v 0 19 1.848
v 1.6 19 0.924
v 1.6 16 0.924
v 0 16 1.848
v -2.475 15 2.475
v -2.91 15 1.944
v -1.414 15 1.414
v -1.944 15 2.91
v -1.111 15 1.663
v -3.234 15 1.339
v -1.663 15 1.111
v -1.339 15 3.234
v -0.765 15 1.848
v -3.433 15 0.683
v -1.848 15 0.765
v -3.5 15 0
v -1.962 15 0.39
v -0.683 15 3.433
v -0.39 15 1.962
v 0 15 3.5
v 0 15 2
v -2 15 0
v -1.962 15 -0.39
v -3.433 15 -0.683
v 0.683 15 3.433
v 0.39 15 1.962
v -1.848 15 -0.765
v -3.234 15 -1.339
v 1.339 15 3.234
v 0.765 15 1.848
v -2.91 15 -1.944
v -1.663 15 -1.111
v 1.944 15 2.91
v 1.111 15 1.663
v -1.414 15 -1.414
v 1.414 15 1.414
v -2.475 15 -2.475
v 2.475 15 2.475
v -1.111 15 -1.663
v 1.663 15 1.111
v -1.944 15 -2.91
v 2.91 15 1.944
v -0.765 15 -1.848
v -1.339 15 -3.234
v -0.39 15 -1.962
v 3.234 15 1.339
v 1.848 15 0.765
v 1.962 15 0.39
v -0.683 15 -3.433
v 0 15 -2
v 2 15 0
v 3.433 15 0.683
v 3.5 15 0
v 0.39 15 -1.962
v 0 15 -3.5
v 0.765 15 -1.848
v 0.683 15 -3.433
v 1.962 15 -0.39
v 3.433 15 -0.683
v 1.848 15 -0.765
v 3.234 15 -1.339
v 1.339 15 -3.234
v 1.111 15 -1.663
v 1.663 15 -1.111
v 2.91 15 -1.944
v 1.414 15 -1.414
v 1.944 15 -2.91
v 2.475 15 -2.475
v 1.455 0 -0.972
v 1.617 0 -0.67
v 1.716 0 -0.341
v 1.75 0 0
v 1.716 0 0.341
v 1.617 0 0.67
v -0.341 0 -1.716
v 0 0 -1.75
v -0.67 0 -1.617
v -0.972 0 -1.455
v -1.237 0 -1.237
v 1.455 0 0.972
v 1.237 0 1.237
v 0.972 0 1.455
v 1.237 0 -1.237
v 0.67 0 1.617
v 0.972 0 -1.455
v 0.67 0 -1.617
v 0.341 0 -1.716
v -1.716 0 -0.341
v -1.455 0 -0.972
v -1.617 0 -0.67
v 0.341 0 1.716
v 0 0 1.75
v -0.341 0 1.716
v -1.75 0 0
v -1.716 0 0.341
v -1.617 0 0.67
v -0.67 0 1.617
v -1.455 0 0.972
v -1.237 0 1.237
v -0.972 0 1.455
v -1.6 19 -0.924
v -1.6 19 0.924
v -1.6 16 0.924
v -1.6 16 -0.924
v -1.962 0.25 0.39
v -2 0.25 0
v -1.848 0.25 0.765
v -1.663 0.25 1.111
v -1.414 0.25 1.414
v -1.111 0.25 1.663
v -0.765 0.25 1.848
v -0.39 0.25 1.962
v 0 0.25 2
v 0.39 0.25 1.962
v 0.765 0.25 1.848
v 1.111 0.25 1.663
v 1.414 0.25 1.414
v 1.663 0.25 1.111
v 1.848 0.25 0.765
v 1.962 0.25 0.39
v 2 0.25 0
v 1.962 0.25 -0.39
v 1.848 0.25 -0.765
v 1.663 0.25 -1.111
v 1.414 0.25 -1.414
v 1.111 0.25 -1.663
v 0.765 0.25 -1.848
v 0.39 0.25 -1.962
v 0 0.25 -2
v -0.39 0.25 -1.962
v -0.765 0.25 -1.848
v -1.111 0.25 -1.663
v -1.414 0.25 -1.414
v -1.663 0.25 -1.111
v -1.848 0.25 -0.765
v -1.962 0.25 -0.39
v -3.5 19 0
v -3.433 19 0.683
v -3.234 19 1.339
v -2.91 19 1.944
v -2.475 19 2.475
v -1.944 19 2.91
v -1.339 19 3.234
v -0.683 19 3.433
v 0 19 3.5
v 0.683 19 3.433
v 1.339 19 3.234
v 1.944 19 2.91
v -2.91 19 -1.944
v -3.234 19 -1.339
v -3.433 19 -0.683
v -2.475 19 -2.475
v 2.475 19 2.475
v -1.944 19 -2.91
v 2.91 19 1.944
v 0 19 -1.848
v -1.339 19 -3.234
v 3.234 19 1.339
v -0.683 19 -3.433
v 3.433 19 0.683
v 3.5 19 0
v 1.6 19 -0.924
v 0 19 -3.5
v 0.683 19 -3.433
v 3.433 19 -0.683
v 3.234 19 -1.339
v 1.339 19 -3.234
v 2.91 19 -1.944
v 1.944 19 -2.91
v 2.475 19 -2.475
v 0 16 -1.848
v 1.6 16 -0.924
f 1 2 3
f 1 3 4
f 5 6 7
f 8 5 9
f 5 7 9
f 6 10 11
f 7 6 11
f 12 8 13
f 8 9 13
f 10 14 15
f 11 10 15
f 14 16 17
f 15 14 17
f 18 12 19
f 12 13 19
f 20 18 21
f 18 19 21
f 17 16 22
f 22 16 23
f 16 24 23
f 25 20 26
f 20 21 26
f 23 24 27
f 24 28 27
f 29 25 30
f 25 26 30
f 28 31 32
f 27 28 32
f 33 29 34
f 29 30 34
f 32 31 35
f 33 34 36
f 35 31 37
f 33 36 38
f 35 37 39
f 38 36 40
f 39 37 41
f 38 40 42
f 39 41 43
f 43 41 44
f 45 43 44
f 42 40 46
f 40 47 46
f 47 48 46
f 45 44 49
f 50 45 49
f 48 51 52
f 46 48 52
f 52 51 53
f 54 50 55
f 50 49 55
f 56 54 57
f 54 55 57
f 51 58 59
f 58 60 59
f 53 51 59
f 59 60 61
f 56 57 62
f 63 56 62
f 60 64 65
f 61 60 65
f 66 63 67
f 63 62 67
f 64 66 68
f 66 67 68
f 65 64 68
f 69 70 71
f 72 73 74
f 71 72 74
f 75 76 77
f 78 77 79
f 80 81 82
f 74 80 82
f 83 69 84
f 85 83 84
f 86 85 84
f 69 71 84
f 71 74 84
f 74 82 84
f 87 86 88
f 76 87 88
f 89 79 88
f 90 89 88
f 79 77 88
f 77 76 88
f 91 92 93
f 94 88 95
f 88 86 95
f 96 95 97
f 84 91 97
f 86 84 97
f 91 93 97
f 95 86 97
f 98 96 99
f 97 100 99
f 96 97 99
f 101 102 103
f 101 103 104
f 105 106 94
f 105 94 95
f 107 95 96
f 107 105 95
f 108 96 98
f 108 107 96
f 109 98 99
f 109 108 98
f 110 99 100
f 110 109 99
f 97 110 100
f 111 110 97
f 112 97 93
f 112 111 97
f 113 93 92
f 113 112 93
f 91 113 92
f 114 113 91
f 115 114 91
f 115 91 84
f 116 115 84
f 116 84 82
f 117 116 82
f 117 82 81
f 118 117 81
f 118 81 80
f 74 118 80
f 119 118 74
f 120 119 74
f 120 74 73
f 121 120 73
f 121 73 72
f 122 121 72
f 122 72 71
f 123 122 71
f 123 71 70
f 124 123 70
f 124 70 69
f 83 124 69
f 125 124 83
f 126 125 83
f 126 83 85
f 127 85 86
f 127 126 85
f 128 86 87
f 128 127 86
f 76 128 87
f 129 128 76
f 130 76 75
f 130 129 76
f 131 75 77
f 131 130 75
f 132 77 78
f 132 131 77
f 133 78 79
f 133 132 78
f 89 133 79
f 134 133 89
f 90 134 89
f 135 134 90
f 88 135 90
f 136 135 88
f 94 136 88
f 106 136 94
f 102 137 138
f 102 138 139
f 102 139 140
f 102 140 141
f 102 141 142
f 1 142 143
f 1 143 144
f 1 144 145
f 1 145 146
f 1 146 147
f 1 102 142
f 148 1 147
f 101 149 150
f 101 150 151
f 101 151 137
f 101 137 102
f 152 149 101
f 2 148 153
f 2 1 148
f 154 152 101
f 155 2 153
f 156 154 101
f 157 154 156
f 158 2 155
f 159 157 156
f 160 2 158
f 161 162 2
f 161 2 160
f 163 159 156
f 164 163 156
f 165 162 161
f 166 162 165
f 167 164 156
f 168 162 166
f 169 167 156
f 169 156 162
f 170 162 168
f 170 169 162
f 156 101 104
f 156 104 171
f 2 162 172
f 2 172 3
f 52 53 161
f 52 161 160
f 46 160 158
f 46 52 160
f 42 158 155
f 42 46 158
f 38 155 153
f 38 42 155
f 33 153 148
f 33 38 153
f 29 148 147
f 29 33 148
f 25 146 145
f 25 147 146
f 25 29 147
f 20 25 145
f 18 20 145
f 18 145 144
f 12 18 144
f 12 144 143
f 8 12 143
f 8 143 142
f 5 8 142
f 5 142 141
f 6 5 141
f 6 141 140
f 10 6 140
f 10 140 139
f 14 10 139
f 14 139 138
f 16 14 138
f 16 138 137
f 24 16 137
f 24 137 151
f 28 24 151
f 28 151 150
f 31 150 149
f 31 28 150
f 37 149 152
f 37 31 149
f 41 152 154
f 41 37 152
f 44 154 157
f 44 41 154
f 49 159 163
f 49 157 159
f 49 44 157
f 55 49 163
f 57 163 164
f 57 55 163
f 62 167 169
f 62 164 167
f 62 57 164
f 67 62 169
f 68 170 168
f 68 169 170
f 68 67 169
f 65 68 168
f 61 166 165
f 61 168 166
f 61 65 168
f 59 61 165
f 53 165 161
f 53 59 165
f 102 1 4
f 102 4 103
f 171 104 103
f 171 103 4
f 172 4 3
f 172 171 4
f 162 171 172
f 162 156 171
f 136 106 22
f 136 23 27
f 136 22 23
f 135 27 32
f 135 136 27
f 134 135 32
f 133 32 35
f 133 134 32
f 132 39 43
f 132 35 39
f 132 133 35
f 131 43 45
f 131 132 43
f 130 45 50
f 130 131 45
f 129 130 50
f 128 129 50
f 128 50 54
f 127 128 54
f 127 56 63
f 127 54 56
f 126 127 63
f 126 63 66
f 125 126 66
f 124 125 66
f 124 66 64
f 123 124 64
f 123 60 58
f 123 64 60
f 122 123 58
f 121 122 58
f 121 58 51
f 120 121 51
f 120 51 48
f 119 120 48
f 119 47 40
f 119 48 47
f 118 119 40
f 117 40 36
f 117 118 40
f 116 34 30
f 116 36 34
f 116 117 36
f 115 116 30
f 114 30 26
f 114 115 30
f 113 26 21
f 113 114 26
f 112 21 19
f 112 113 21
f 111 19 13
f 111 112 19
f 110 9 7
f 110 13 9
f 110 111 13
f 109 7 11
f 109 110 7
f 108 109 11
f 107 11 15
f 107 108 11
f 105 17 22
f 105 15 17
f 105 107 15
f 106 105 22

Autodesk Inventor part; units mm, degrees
ref_plane "YZ Plane" through (0, 0, 0) normal (1, 0, 0) x (0, 1, 0)
ref_plane "XZ Plane" through (0, 0, 0) normal (0, 1, 0) x (-1, 0, 0)
ref_plane "XY Plane" through (0, 0, 0) normal (0, 0, 1) x (1, 0, 0)
sketch "Sketch1" plane through (0, 0, 0) normal (0, 1, 0) x (-1, 0, 0)
  circle A0 centre (0, 0) radius 2
  dimension "d0" = 4
extrude "Extrusion1" add sketch "Sketch1" along normal blind 15
sketch "Sketch2" plane through (0, 15, 0) normal (0, 1, 0) x (1, 0, 0)
  circle A0 centre (0, 0) radius 2 projected
  circle A1 centre (0, 0) radius 3.5
  dimension "d3" = 7
extrude "Extrusion2" add sketch "Sketch2" along normal blind 4 contours A0 | A1
sketch "Sketch3" plane through (0, 19, 0) normal (0, 1, 0) x (1, 0, 0)
  circle A0 centre (0, 0) radius 3.5 projected
  line L0 (0, 1.8475) -> (1.6, 0.9238)
  line L1 (1.6, 0.9238) -> (1.6, -0.9238)
  line L2 (1.6, -0.9238) -> (0, -1.8475)
  line L3 (0, -1.8475) -> (-1.6, -0.9238)
  line L4 (-1.6, -0.9238) -> (-1.6, 0.9238)
  line L5 (-1.6, 0.9238) -> (0, 1.8475)
  dimension "d6" = 1.6
extrude "Extrusion3" cut sketch "Sketch3" against normal blind 3 contours L0 L1 L2 L3 L4 L5
thread "Thread1" size "M4x0.7" class "6g" standard "ANSI Metric M Profile" full length
chamfer "Chamfer1" distance 0.25 angle 45 1 edges at (2, 0, 0)
properties part number "SHCS4x15"
